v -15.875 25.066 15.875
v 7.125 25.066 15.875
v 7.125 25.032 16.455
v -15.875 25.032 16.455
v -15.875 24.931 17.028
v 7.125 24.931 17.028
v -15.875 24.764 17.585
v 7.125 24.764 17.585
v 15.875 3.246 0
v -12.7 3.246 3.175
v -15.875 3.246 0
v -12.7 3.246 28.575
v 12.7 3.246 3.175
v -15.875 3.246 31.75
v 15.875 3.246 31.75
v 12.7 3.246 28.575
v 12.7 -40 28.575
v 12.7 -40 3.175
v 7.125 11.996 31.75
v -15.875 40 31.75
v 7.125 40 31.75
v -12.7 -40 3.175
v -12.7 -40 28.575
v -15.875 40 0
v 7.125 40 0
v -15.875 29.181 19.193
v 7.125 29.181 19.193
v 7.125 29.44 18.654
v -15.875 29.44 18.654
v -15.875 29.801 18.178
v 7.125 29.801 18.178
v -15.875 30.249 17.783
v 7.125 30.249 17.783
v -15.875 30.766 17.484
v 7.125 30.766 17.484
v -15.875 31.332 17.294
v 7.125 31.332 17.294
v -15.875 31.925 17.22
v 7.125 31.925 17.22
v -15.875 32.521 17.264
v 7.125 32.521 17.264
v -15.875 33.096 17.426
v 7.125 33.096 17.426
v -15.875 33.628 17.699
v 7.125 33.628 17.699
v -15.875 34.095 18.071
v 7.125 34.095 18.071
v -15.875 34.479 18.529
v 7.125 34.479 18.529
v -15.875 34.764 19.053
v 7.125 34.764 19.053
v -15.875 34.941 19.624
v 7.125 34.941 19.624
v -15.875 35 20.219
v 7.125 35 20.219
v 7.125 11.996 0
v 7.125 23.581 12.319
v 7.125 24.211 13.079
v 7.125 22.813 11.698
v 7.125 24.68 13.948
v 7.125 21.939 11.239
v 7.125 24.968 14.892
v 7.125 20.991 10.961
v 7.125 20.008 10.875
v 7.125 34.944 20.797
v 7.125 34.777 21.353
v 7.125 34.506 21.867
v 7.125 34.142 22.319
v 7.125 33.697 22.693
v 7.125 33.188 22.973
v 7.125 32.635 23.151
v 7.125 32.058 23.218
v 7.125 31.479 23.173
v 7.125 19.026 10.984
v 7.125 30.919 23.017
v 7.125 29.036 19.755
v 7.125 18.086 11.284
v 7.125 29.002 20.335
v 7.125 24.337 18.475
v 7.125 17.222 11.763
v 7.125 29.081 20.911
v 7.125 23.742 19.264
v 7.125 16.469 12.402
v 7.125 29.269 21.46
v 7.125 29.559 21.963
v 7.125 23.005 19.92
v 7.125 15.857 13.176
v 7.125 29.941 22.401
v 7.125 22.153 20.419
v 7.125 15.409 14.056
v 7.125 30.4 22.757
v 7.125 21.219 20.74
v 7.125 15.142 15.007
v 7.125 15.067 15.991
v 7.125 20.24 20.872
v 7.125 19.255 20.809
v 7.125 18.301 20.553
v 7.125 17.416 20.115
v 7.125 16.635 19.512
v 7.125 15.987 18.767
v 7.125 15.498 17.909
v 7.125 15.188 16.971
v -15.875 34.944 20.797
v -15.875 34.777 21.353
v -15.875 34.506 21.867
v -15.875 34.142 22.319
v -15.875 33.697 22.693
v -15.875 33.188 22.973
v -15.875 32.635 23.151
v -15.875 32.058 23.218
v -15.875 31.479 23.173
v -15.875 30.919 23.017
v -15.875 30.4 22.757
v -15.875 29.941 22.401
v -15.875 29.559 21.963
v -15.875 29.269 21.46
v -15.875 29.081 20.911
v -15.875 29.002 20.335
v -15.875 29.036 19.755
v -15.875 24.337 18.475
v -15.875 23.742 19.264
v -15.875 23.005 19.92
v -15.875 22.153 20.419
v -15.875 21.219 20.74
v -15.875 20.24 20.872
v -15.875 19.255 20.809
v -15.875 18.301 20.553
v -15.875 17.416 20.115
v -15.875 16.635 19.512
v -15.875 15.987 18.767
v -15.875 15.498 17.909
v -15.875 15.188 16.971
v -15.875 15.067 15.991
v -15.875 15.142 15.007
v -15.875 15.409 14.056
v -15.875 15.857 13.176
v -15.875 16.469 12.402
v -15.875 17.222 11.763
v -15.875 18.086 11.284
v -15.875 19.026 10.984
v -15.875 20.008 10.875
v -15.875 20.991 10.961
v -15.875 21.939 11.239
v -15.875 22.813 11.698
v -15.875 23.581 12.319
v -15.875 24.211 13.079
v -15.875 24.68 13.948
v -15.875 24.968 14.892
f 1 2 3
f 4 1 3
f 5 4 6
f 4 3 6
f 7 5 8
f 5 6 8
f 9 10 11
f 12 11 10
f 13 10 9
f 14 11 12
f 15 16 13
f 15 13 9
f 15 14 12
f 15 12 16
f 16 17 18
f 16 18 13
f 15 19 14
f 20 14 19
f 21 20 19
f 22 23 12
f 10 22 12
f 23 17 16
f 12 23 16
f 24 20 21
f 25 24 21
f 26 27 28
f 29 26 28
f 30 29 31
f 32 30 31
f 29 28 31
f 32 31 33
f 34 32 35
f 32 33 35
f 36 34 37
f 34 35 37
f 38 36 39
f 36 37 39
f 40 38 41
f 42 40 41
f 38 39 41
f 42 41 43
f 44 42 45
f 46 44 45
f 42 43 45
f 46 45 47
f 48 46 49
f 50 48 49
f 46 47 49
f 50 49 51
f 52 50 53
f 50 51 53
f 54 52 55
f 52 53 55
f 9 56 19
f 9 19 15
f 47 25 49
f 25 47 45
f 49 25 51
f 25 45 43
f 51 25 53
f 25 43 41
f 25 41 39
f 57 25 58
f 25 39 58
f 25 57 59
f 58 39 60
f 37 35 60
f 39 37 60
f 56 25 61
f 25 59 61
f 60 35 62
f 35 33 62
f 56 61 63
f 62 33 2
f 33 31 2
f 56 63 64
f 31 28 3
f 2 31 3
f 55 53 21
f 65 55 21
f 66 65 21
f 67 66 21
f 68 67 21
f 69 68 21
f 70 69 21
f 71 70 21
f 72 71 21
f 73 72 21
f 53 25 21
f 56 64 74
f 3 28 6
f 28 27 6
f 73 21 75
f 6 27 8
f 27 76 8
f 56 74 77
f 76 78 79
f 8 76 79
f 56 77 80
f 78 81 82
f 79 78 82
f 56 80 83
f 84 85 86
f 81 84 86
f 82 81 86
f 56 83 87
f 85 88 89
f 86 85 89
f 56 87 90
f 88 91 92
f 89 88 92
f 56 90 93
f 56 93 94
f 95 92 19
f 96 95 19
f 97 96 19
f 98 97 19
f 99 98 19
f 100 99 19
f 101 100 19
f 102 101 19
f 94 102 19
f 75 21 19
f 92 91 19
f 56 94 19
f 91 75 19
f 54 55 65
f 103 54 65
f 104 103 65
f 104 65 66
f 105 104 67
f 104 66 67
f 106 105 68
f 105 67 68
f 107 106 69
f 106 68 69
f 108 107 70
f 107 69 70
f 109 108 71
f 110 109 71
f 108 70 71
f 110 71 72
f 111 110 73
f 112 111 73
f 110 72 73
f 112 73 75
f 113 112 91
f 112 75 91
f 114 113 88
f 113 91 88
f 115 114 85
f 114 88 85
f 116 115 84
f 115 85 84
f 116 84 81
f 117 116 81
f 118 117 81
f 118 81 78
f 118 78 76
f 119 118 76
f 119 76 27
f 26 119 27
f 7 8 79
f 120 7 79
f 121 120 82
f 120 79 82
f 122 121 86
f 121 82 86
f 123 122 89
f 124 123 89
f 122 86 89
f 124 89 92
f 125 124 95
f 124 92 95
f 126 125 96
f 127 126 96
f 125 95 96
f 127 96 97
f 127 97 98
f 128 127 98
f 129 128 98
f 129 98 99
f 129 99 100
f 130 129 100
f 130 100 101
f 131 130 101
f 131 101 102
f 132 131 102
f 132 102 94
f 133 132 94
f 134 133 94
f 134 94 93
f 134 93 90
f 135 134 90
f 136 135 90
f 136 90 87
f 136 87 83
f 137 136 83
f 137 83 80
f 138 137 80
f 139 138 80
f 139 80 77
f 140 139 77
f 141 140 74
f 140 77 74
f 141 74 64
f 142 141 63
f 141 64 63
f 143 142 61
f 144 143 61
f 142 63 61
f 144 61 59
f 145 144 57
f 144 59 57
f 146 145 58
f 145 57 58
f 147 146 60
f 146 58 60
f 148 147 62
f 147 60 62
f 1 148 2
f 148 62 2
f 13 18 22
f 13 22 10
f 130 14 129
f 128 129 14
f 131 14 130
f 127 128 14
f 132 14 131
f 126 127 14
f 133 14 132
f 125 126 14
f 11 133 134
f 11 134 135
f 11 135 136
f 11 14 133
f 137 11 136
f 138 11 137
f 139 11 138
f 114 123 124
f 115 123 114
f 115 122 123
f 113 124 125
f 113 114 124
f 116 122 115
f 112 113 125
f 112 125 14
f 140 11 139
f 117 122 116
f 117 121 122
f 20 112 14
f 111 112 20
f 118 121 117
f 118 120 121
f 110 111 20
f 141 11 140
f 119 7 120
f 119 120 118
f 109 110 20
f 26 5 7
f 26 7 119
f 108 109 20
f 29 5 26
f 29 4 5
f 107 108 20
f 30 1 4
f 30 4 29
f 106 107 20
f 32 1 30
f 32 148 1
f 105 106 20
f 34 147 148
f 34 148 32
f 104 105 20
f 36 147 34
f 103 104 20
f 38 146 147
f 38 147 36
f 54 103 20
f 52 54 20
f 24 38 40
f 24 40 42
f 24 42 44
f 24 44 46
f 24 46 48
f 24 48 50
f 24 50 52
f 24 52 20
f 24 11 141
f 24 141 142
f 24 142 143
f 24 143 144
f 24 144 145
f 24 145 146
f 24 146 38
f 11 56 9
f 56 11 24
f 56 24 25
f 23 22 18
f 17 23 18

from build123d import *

# Parameters (mm, degrees)
F0_W     = 31.75
F0_H     = 80
F1_DEPTH = 31.75
F3_DEPTH = 31.751
F4_W     = 25.4
F4_H     = 10
F4_W_2   = 3.175
F4_H_2   = 43.2458060166
F5_DEPTH = 31.751
F6_W     = 47.7026679298
F6_H     = 12.140064659
F6_H_2   = 10.4135097936
F7_DEPTH = 31.751
F9_DEPTH = 31.751


with BuildPart() as f1:
    # F0 (on Top) → F1 (new body)
    with BuildSketch(Plane.XY):
        Rectangle(F0_W, F0_H)
    extrude(amount=F1_DEPTH)

    # F2 (on face) → F3 (cut, through all)
    with BuildSketch(Plane.YZ.offset(15.875)):
        with BuildLine():
            Line((20.065903716, 15.875), (25.065903716, 15.875))
            ThreePointArc((25.065903716, 15.875), (24.9899424811, 16.7432408883), (24.7643668199, 17.5851007166))
            Line((24.7643668199, 17.5851007166), (20.065903716, 15.875))
        make_face()
        with BuildLine():
            ThreePointArc((35, 20.2186558202), (31.479055467, 23.1730790793), (29.1809221376, 19.1925953903))
            ThreePointArc((29.1809221376, 19.1925953903), (32.520944533, 17.2642325612), (35, 20.2186558202))
        make_face()
        with BuildLine():
            ThreePointArc((24.7643668199, 17.5851007166), (15.141864951, 15.0067591117), (25.065903716, 15.875))
            Line((25.065903716, 15.875), (20.065903716, 15.875))
            Line((20.065903716, 15.875), (24.7643668199, 17.5851007166))
        make_face()
    extrude(amount=-F3_DEPTH, mode=Mode.SUBTRACT)

    # F4 (on face) → F5 (cut, through all)
    with BuildSketch(Plane.XY.offset(31.75)):
        with Locations((0, -45)):
            Rectangle(F4_W, F4_H)
        with Locations((14.2875, -18.3770969917)):
            Rectangle(F4_W_2, F4_H_2)
        with Locations((-14.2875, -18.3770969917)):
            Rectangle(F4_W_2, F4_H_2)
    extrude(amount=-F5_DEPTH, mode=Mode.SUBTRACT)

    # F6 (on face) → F7 (cut, through all)
    with BuildSketch(Plane.YZ.offset(15.875)):
        with Locations((-20.6055279483, 34.6450323295)):
            Rectangle(F6_W, F6_H)
        with Locations((-20.6055279483, -2.0317548968)):
            Rectangle(F6_W, F6_H_2)
    extrude(amount=-F7_DEPTH, mode=Mode.SUBTRACT)

    # F8 (on face) → F9 (cut, through all)
    with BuildSketch(Plane.XY.offset(31.75)):
        Polygon((15.875, 3.2458060166), (15.875, 40), (7.125, 40), (7.125, 11.9958060166), align=None)
    extrude(amount=-F9_DEPTH, mode=Mode.SUBTRACT)


solid = f1.part
